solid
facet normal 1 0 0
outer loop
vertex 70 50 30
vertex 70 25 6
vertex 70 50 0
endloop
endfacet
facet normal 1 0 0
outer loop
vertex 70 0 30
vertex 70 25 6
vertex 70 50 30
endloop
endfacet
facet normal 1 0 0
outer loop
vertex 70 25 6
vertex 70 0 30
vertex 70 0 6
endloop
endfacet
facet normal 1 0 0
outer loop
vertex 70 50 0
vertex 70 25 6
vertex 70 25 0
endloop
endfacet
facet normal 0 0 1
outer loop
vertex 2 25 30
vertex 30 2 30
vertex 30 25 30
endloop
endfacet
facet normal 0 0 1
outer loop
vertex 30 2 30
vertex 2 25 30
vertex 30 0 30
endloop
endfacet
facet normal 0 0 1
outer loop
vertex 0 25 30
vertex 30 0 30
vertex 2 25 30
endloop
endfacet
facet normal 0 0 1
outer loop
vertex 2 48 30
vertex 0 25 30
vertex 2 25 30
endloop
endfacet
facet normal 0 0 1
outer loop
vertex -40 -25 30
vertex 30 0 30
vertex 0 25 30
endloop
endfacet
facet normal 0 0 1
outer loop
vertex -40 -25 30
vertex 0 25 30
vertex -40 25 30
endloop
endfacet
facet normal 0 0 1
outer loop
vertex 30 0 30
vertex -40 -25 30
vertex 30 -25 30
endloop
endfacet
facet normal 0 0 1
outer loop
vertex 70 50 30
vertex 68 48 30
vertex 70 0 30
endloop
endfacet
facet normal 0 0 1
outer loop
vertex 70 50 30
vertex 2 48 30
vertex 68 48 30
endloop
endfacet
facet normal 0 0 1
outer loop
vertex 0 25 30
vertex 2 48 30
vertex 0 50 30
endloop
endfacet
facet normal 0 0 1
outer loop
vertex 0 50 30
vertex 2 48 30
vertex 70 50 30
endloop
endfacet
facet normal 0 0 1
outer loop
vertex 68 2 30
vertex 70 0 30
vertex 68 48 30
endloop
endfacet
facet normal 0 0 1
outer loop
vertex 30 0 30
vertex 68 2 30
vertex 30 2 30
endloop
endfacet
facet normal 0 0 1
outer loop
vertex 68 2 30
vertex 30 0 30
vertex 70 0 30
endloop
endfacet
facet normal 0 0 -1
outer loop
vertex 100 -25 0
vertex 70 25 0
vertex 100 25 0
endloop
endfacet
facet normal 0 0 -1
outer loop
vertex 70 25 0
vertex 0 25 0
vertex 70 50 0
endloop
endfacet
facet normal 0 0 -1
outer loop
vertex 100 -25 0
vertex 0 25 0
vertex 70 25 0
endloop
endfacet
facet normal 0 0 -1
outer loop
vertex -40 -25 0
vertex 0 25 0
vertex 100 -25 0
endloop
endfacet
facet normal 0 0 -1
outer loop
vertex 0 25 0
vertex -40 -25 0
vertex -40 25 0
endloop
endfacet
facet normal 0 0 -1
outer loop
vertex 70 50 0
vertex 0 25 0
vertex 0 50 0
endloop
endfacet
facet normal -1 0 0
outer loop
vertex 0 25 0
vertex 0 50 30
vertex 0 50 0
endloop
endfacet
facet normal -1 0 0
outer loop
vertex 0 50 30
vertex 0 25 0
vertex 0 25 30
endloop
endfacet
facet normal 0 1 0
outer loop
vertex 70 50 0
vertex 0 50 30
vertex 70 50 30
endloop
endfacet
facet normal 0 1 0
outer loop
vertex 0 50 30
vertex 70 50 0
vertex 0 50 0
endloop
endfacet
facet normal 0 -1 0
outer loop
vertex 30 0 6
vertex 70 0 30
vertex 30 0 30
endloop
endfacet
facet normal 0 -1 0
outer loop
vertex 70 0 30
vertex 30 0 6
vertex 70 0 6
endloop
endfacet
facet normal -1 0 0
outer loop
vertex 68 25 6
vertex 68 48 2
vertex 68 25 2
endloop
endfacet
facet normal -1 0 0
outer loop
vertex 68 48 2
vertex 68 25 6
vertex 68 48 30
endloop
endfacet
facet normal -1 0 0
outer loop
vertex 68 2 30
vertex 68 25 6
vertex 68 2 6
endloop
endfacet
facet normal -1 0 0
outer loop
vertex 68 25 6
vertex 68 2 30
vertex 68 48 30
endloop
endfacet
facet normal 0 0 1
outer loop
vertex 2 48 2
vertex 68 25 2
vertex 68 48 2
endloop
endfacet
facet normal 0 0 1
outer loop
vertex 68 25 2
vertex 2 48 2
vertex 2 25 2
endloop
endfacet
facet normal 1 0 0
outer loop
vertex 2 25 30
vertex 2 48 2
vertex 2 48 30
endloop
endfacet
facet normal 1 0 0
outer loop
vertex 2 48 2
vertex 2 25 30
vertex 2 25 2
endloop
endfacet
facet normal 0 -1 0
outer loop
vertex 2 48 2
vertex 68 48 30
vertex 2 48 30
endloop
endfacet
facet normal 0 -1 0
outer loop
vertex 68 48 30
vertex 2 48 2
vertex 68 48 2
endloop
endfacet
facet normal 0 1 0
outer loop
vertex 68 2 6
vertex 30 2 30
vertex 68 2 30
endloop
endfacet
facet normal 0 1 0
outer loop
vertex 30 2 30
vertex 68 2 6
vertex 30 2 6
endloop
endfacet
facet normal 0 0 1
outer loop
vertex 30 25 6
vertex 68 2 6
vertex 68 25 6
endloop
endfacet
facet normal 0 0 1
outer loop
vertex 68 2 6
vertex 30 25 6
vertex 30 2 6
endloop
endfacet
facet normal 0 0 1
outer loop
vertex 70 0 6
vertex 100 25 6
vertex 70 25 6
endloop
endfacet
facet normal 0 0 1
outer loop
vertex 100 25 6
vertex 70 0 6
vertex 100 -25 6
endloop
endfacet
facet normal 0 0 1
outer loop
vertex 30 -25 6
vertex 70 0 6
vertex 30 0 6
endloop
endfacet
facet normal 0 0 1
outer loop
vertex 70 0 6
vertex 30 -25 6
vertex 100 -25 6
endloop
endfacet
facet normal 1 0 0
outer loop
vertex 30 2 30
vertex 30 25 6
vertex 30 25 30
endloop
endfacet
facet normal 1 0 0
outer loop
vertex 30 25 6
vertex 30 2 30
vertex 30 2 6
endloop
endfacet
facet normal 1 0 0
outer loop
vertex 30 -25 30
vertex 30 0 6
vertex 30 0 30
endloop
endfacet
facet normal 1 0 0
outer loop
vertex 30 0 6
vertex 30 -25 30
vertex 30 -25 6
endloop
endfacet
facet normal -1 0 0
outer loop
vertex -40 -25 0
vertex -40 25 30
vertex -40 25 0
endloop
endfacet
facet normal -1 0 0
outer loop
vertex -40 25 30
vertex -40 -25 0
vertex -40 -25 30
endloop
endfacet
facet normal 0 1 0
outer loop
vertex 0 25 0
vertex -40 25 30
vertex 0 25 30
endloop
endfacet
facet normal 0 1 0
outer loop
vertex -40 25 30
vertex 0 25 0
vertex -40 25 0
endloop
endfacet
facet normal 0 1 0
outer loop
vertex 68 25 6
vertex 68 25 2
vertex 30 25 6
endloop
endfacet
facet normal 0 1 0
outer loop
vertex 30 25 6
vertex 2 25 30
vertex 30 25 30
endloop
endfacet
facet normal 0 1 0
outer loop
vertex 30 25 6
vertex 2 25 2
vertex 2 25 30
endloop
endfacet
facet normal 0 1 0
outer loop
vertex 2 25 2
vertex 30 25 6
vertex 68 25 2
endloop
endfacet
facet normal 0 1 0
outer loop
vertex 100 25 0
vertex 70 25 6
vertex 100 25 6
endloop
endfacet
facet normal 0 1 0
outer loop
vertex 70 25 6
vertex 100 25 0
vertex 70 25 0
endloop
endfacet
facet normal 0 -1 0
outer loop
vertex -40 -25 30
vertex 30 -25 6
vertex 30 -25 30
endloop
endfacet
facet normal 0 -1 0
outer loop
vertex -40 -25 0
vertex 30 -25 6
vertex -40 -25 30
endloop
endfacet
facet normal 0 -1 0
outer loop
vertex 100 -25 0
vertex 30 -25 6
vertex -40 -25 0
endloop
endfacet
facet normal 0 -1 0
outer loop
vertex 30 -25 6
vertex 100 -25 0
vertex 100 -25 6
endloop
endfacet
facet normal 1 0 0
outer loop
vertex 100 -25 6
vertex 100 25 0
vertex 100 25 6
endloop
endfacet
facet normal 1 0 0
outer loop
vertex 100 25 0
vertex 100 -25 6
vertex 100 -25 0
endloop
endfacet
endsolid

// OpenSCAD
// Two-part enclosure for a small electronics board (e.g. Arduino-based temperature logger)
// Print orientation: box upright, lid upside down (on the +X side of the box)
// Units: mm

// ---------------- Parameters ----------------
box_x      = 70;    // box outer length (X)
box_y      = 50;    // box outer width (Y)
box_h      = 30;    // box outer height (Z)
wall       = 2;     // box wall thickness
floor      = 2;     // box floor thickness
lip_t      = 1.5;   // lid lip thickness
lip_h      = 4;     // lid lip height (extends above the 2 mm plate)
lip_x      = 65.6;  // lid lip outer length (X)
lip_y      = 45.6;  // lid lip outer width (Y)
clearance  = 0.2;   // side clearance between lip and box opening
gap        = 10;    // gap between box and lid on the bed
eps        = 0.5;   // cutter overshoot past faces

$fn = 64;

// Derived: box inner size
box_i_x = box_x - 2 * wall;
box_i_y = box_y - 2 * wall;

// ---------------- Model ----------------
union() {
    // Part 1: Box (open top)
    difference() {
        cube([box_x, box_y, box_h]);
        // open-top cavity, walls + floor
        translate([wall, wall, floor])
            cube([box_i_x, box_i_y, box_h - floor]);
    }

    // Part 2: Lid (plate with a centred lip that slides into the box opening)
    union() {
        // base plate, 2 mm thick, same footprint as the box
        cube([box_x, box_y, 2]);

        // lip: a rectangular block, 1.5 mm thick (X), 4 mm tall (Z),
        // outer size 65.6 x 45.6 mm, centred on the plate
        translate([-lip_x / 2, -lip_y / 2, 0])
            cube([lip_x, lip_y, 2 + lip_h]);
    }
}

// ---------------- Layout ----------------
translate([-box_x / 2 - gap / 2, -box_y / 2, 0])      // box
cube([box_x, box_y, box_h]);

translate([box_x / 2 - gap / 2, -box_y / 2, 0])       // lid
cube([box_x, box_y, 2 + lip_h]);
